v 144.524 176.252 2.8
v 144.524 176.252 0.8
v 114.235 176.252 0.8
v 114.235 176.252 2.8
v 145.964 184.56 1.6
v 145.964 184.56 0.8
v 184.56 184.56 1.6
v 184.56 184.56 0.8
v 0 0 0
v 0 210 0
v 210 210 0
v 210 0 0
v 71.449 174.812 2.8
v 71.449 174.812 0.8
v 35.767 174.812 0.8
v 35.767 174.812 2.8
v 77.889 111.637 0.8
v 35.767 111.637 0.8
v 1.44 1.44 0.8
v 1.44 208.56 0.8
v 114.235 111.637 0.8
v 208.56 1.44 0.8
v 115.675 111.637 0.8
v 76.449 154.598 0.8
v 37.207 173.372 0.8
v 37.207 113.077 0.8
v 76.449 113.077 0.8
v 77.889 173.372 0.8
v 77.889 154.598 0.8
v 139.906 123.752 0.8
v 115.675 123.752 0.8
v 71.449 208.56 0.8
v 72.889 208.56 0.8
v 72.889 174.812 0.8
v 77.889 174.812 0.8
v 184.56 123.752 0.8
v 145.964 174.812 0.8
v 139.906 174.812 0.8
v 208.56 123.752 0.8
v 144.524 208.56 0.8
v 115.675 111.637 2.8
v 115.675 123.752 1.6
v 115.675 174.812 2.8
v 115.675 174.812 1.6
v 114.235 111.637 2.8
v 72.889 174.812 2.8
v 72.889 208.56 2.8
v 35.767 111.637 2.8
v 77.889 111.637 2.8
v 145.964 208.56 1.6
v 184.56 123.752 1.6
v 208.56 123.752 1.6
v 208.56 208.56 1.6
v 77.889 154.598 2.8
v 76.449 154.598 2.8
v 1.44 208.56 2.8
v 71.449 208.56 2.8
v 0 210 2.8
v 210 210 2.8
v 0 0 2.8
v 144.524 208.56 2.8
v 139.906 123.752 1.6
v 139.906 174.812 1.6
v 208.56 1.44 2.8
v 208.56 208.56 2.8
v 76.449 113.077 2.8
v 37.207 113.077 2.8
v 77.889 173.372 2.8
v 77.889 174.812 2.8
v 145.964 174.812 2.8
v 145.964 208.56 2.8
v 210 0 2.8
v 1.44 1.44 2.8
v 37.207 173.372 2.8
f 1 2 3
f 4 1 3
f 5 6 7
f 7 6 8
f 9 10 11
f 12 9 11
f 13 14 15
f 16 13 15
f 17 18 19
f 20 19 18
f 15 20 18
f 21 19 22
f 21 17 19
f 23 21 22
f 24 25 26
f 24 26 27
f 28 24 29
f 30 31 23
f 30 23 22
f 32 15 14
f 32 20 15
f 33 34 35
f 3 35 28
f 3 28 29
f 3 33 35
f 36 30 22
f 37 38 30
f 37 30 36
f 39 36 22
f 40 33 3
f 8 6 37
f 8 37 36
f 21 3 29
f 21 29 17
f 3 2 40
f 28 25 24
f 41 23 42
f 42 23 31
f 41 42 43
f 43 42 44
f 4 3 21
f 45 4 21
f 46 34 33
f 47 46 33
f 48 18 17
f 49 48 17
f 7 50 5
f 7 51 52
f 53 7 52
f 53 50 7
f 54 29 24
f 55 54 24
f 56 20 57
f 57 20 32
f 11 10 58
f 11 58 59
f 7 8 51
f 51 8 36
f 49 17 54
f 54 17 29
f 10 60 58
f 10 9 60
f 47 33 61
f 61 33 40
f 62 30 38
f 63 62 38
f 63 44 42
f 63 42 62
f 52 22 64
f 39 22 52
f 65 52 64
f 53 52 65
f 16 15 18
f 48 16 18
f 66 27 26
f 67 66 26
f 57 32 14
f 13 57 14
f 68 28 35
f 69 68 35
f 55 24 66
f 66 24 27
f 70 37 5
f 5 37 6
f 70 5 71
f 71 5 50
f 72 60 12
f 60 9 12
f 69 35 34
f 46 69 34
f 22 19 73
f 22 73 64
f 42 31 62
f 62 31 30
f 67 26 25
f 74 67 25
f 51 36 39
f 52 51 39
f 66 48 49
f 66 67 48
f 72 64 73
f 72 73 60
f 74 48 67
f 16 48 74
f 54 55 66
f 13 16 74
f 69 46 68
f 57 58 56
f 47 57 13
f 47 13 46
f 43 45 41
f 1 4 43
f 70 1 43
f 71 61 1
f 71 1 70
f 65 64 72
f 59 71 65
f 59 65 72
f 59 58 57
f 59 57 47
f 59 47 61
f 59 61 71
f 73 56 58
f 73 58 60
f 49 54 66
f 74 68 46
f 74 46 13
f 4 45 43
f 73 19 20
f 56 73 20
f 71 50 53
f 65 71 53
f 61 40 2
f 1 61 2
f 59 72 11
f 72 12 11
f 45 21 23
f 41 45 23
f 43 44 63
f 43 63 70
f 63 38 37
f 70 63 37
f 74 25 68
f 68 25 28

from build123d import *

# Parameters (mm, degrees)
F0_W     = 210
F0_H     = 210
F1_DEPTH = 0.8
F2_W     = 210
F2_H     = 210
F2_W_2   = 207.12
F2_H_2   = 207.12
F3_DEPTH = 2
F5_DEPTH = 2
F6_W     = 24.230769
F6_H     = 51.06
F7_DEPTH = 0.8


with BuildPart() as f1:
    # F0 (on Top) → F1 (new body)
    with BuildSketch(Plane.XY):
        with Locations((105, 105)):
            Rectangle(F0_W, F0_H)
    extrude(amount=F1_DEPTH)

    # F2 (on face) → F3 (join)
    with BuildSketch(Plane.XY.offset(0.8)):
        with Locations((105, 105)):
            Rectangle(F2_W, F2_H)
        with Locations((105, 105)):
            Rectangle(F2_W_2, F2_H_2, mode=Mode.SUBTRACT)
    extrude(amount=F3_DEPTH)

    # F4 (on face) → F5 (join, through all)
    with BuildSketch(Plane.XY.offset(0.8)):
        Polygon((145.963846, 174.812308), (145.963846, 208.56), (144.523846, 208.56), (144.523846, 176.252308), (114.235385, 176.252308), (114.235385, 111.636923), (115.675385, 111.636923), (115.675385, 174.812308), align=None)
        Polygon((72.889231, 174.812308), (72.889231, 208.56), (71.449231, 208.56), (71.449231, 174.812308), (35.766923, 174.812308), (35.766923, 111.636923), (77.889231, 111.636923), (77.889231, 154.598162), (76.449231, 154.598162), (76.449231, 113.076923), (37.206923, 113.076923), (37.206923, 173.372308), (77.889231, 173.372308), (77.889231, 174.812308), align=None)
    extrude(amount=F5_DEPTH)

    # F6 (on face) → F7 (join)
    with BuildSketch(Plane.XY.offset(0.8)):
        Polygon((208.56, 208.56), (145.963846, 208.56), (145.963846, 184.56), (184.56, 184.56), (184.56, 123.752308), (208.56, 123.752308), align=None)
        with Locations((127.790769, 149.282308)):
            Rectangle(F6_W, F6_H)
    extrude(amount=F7_DEPTH)


solid = f1.part
